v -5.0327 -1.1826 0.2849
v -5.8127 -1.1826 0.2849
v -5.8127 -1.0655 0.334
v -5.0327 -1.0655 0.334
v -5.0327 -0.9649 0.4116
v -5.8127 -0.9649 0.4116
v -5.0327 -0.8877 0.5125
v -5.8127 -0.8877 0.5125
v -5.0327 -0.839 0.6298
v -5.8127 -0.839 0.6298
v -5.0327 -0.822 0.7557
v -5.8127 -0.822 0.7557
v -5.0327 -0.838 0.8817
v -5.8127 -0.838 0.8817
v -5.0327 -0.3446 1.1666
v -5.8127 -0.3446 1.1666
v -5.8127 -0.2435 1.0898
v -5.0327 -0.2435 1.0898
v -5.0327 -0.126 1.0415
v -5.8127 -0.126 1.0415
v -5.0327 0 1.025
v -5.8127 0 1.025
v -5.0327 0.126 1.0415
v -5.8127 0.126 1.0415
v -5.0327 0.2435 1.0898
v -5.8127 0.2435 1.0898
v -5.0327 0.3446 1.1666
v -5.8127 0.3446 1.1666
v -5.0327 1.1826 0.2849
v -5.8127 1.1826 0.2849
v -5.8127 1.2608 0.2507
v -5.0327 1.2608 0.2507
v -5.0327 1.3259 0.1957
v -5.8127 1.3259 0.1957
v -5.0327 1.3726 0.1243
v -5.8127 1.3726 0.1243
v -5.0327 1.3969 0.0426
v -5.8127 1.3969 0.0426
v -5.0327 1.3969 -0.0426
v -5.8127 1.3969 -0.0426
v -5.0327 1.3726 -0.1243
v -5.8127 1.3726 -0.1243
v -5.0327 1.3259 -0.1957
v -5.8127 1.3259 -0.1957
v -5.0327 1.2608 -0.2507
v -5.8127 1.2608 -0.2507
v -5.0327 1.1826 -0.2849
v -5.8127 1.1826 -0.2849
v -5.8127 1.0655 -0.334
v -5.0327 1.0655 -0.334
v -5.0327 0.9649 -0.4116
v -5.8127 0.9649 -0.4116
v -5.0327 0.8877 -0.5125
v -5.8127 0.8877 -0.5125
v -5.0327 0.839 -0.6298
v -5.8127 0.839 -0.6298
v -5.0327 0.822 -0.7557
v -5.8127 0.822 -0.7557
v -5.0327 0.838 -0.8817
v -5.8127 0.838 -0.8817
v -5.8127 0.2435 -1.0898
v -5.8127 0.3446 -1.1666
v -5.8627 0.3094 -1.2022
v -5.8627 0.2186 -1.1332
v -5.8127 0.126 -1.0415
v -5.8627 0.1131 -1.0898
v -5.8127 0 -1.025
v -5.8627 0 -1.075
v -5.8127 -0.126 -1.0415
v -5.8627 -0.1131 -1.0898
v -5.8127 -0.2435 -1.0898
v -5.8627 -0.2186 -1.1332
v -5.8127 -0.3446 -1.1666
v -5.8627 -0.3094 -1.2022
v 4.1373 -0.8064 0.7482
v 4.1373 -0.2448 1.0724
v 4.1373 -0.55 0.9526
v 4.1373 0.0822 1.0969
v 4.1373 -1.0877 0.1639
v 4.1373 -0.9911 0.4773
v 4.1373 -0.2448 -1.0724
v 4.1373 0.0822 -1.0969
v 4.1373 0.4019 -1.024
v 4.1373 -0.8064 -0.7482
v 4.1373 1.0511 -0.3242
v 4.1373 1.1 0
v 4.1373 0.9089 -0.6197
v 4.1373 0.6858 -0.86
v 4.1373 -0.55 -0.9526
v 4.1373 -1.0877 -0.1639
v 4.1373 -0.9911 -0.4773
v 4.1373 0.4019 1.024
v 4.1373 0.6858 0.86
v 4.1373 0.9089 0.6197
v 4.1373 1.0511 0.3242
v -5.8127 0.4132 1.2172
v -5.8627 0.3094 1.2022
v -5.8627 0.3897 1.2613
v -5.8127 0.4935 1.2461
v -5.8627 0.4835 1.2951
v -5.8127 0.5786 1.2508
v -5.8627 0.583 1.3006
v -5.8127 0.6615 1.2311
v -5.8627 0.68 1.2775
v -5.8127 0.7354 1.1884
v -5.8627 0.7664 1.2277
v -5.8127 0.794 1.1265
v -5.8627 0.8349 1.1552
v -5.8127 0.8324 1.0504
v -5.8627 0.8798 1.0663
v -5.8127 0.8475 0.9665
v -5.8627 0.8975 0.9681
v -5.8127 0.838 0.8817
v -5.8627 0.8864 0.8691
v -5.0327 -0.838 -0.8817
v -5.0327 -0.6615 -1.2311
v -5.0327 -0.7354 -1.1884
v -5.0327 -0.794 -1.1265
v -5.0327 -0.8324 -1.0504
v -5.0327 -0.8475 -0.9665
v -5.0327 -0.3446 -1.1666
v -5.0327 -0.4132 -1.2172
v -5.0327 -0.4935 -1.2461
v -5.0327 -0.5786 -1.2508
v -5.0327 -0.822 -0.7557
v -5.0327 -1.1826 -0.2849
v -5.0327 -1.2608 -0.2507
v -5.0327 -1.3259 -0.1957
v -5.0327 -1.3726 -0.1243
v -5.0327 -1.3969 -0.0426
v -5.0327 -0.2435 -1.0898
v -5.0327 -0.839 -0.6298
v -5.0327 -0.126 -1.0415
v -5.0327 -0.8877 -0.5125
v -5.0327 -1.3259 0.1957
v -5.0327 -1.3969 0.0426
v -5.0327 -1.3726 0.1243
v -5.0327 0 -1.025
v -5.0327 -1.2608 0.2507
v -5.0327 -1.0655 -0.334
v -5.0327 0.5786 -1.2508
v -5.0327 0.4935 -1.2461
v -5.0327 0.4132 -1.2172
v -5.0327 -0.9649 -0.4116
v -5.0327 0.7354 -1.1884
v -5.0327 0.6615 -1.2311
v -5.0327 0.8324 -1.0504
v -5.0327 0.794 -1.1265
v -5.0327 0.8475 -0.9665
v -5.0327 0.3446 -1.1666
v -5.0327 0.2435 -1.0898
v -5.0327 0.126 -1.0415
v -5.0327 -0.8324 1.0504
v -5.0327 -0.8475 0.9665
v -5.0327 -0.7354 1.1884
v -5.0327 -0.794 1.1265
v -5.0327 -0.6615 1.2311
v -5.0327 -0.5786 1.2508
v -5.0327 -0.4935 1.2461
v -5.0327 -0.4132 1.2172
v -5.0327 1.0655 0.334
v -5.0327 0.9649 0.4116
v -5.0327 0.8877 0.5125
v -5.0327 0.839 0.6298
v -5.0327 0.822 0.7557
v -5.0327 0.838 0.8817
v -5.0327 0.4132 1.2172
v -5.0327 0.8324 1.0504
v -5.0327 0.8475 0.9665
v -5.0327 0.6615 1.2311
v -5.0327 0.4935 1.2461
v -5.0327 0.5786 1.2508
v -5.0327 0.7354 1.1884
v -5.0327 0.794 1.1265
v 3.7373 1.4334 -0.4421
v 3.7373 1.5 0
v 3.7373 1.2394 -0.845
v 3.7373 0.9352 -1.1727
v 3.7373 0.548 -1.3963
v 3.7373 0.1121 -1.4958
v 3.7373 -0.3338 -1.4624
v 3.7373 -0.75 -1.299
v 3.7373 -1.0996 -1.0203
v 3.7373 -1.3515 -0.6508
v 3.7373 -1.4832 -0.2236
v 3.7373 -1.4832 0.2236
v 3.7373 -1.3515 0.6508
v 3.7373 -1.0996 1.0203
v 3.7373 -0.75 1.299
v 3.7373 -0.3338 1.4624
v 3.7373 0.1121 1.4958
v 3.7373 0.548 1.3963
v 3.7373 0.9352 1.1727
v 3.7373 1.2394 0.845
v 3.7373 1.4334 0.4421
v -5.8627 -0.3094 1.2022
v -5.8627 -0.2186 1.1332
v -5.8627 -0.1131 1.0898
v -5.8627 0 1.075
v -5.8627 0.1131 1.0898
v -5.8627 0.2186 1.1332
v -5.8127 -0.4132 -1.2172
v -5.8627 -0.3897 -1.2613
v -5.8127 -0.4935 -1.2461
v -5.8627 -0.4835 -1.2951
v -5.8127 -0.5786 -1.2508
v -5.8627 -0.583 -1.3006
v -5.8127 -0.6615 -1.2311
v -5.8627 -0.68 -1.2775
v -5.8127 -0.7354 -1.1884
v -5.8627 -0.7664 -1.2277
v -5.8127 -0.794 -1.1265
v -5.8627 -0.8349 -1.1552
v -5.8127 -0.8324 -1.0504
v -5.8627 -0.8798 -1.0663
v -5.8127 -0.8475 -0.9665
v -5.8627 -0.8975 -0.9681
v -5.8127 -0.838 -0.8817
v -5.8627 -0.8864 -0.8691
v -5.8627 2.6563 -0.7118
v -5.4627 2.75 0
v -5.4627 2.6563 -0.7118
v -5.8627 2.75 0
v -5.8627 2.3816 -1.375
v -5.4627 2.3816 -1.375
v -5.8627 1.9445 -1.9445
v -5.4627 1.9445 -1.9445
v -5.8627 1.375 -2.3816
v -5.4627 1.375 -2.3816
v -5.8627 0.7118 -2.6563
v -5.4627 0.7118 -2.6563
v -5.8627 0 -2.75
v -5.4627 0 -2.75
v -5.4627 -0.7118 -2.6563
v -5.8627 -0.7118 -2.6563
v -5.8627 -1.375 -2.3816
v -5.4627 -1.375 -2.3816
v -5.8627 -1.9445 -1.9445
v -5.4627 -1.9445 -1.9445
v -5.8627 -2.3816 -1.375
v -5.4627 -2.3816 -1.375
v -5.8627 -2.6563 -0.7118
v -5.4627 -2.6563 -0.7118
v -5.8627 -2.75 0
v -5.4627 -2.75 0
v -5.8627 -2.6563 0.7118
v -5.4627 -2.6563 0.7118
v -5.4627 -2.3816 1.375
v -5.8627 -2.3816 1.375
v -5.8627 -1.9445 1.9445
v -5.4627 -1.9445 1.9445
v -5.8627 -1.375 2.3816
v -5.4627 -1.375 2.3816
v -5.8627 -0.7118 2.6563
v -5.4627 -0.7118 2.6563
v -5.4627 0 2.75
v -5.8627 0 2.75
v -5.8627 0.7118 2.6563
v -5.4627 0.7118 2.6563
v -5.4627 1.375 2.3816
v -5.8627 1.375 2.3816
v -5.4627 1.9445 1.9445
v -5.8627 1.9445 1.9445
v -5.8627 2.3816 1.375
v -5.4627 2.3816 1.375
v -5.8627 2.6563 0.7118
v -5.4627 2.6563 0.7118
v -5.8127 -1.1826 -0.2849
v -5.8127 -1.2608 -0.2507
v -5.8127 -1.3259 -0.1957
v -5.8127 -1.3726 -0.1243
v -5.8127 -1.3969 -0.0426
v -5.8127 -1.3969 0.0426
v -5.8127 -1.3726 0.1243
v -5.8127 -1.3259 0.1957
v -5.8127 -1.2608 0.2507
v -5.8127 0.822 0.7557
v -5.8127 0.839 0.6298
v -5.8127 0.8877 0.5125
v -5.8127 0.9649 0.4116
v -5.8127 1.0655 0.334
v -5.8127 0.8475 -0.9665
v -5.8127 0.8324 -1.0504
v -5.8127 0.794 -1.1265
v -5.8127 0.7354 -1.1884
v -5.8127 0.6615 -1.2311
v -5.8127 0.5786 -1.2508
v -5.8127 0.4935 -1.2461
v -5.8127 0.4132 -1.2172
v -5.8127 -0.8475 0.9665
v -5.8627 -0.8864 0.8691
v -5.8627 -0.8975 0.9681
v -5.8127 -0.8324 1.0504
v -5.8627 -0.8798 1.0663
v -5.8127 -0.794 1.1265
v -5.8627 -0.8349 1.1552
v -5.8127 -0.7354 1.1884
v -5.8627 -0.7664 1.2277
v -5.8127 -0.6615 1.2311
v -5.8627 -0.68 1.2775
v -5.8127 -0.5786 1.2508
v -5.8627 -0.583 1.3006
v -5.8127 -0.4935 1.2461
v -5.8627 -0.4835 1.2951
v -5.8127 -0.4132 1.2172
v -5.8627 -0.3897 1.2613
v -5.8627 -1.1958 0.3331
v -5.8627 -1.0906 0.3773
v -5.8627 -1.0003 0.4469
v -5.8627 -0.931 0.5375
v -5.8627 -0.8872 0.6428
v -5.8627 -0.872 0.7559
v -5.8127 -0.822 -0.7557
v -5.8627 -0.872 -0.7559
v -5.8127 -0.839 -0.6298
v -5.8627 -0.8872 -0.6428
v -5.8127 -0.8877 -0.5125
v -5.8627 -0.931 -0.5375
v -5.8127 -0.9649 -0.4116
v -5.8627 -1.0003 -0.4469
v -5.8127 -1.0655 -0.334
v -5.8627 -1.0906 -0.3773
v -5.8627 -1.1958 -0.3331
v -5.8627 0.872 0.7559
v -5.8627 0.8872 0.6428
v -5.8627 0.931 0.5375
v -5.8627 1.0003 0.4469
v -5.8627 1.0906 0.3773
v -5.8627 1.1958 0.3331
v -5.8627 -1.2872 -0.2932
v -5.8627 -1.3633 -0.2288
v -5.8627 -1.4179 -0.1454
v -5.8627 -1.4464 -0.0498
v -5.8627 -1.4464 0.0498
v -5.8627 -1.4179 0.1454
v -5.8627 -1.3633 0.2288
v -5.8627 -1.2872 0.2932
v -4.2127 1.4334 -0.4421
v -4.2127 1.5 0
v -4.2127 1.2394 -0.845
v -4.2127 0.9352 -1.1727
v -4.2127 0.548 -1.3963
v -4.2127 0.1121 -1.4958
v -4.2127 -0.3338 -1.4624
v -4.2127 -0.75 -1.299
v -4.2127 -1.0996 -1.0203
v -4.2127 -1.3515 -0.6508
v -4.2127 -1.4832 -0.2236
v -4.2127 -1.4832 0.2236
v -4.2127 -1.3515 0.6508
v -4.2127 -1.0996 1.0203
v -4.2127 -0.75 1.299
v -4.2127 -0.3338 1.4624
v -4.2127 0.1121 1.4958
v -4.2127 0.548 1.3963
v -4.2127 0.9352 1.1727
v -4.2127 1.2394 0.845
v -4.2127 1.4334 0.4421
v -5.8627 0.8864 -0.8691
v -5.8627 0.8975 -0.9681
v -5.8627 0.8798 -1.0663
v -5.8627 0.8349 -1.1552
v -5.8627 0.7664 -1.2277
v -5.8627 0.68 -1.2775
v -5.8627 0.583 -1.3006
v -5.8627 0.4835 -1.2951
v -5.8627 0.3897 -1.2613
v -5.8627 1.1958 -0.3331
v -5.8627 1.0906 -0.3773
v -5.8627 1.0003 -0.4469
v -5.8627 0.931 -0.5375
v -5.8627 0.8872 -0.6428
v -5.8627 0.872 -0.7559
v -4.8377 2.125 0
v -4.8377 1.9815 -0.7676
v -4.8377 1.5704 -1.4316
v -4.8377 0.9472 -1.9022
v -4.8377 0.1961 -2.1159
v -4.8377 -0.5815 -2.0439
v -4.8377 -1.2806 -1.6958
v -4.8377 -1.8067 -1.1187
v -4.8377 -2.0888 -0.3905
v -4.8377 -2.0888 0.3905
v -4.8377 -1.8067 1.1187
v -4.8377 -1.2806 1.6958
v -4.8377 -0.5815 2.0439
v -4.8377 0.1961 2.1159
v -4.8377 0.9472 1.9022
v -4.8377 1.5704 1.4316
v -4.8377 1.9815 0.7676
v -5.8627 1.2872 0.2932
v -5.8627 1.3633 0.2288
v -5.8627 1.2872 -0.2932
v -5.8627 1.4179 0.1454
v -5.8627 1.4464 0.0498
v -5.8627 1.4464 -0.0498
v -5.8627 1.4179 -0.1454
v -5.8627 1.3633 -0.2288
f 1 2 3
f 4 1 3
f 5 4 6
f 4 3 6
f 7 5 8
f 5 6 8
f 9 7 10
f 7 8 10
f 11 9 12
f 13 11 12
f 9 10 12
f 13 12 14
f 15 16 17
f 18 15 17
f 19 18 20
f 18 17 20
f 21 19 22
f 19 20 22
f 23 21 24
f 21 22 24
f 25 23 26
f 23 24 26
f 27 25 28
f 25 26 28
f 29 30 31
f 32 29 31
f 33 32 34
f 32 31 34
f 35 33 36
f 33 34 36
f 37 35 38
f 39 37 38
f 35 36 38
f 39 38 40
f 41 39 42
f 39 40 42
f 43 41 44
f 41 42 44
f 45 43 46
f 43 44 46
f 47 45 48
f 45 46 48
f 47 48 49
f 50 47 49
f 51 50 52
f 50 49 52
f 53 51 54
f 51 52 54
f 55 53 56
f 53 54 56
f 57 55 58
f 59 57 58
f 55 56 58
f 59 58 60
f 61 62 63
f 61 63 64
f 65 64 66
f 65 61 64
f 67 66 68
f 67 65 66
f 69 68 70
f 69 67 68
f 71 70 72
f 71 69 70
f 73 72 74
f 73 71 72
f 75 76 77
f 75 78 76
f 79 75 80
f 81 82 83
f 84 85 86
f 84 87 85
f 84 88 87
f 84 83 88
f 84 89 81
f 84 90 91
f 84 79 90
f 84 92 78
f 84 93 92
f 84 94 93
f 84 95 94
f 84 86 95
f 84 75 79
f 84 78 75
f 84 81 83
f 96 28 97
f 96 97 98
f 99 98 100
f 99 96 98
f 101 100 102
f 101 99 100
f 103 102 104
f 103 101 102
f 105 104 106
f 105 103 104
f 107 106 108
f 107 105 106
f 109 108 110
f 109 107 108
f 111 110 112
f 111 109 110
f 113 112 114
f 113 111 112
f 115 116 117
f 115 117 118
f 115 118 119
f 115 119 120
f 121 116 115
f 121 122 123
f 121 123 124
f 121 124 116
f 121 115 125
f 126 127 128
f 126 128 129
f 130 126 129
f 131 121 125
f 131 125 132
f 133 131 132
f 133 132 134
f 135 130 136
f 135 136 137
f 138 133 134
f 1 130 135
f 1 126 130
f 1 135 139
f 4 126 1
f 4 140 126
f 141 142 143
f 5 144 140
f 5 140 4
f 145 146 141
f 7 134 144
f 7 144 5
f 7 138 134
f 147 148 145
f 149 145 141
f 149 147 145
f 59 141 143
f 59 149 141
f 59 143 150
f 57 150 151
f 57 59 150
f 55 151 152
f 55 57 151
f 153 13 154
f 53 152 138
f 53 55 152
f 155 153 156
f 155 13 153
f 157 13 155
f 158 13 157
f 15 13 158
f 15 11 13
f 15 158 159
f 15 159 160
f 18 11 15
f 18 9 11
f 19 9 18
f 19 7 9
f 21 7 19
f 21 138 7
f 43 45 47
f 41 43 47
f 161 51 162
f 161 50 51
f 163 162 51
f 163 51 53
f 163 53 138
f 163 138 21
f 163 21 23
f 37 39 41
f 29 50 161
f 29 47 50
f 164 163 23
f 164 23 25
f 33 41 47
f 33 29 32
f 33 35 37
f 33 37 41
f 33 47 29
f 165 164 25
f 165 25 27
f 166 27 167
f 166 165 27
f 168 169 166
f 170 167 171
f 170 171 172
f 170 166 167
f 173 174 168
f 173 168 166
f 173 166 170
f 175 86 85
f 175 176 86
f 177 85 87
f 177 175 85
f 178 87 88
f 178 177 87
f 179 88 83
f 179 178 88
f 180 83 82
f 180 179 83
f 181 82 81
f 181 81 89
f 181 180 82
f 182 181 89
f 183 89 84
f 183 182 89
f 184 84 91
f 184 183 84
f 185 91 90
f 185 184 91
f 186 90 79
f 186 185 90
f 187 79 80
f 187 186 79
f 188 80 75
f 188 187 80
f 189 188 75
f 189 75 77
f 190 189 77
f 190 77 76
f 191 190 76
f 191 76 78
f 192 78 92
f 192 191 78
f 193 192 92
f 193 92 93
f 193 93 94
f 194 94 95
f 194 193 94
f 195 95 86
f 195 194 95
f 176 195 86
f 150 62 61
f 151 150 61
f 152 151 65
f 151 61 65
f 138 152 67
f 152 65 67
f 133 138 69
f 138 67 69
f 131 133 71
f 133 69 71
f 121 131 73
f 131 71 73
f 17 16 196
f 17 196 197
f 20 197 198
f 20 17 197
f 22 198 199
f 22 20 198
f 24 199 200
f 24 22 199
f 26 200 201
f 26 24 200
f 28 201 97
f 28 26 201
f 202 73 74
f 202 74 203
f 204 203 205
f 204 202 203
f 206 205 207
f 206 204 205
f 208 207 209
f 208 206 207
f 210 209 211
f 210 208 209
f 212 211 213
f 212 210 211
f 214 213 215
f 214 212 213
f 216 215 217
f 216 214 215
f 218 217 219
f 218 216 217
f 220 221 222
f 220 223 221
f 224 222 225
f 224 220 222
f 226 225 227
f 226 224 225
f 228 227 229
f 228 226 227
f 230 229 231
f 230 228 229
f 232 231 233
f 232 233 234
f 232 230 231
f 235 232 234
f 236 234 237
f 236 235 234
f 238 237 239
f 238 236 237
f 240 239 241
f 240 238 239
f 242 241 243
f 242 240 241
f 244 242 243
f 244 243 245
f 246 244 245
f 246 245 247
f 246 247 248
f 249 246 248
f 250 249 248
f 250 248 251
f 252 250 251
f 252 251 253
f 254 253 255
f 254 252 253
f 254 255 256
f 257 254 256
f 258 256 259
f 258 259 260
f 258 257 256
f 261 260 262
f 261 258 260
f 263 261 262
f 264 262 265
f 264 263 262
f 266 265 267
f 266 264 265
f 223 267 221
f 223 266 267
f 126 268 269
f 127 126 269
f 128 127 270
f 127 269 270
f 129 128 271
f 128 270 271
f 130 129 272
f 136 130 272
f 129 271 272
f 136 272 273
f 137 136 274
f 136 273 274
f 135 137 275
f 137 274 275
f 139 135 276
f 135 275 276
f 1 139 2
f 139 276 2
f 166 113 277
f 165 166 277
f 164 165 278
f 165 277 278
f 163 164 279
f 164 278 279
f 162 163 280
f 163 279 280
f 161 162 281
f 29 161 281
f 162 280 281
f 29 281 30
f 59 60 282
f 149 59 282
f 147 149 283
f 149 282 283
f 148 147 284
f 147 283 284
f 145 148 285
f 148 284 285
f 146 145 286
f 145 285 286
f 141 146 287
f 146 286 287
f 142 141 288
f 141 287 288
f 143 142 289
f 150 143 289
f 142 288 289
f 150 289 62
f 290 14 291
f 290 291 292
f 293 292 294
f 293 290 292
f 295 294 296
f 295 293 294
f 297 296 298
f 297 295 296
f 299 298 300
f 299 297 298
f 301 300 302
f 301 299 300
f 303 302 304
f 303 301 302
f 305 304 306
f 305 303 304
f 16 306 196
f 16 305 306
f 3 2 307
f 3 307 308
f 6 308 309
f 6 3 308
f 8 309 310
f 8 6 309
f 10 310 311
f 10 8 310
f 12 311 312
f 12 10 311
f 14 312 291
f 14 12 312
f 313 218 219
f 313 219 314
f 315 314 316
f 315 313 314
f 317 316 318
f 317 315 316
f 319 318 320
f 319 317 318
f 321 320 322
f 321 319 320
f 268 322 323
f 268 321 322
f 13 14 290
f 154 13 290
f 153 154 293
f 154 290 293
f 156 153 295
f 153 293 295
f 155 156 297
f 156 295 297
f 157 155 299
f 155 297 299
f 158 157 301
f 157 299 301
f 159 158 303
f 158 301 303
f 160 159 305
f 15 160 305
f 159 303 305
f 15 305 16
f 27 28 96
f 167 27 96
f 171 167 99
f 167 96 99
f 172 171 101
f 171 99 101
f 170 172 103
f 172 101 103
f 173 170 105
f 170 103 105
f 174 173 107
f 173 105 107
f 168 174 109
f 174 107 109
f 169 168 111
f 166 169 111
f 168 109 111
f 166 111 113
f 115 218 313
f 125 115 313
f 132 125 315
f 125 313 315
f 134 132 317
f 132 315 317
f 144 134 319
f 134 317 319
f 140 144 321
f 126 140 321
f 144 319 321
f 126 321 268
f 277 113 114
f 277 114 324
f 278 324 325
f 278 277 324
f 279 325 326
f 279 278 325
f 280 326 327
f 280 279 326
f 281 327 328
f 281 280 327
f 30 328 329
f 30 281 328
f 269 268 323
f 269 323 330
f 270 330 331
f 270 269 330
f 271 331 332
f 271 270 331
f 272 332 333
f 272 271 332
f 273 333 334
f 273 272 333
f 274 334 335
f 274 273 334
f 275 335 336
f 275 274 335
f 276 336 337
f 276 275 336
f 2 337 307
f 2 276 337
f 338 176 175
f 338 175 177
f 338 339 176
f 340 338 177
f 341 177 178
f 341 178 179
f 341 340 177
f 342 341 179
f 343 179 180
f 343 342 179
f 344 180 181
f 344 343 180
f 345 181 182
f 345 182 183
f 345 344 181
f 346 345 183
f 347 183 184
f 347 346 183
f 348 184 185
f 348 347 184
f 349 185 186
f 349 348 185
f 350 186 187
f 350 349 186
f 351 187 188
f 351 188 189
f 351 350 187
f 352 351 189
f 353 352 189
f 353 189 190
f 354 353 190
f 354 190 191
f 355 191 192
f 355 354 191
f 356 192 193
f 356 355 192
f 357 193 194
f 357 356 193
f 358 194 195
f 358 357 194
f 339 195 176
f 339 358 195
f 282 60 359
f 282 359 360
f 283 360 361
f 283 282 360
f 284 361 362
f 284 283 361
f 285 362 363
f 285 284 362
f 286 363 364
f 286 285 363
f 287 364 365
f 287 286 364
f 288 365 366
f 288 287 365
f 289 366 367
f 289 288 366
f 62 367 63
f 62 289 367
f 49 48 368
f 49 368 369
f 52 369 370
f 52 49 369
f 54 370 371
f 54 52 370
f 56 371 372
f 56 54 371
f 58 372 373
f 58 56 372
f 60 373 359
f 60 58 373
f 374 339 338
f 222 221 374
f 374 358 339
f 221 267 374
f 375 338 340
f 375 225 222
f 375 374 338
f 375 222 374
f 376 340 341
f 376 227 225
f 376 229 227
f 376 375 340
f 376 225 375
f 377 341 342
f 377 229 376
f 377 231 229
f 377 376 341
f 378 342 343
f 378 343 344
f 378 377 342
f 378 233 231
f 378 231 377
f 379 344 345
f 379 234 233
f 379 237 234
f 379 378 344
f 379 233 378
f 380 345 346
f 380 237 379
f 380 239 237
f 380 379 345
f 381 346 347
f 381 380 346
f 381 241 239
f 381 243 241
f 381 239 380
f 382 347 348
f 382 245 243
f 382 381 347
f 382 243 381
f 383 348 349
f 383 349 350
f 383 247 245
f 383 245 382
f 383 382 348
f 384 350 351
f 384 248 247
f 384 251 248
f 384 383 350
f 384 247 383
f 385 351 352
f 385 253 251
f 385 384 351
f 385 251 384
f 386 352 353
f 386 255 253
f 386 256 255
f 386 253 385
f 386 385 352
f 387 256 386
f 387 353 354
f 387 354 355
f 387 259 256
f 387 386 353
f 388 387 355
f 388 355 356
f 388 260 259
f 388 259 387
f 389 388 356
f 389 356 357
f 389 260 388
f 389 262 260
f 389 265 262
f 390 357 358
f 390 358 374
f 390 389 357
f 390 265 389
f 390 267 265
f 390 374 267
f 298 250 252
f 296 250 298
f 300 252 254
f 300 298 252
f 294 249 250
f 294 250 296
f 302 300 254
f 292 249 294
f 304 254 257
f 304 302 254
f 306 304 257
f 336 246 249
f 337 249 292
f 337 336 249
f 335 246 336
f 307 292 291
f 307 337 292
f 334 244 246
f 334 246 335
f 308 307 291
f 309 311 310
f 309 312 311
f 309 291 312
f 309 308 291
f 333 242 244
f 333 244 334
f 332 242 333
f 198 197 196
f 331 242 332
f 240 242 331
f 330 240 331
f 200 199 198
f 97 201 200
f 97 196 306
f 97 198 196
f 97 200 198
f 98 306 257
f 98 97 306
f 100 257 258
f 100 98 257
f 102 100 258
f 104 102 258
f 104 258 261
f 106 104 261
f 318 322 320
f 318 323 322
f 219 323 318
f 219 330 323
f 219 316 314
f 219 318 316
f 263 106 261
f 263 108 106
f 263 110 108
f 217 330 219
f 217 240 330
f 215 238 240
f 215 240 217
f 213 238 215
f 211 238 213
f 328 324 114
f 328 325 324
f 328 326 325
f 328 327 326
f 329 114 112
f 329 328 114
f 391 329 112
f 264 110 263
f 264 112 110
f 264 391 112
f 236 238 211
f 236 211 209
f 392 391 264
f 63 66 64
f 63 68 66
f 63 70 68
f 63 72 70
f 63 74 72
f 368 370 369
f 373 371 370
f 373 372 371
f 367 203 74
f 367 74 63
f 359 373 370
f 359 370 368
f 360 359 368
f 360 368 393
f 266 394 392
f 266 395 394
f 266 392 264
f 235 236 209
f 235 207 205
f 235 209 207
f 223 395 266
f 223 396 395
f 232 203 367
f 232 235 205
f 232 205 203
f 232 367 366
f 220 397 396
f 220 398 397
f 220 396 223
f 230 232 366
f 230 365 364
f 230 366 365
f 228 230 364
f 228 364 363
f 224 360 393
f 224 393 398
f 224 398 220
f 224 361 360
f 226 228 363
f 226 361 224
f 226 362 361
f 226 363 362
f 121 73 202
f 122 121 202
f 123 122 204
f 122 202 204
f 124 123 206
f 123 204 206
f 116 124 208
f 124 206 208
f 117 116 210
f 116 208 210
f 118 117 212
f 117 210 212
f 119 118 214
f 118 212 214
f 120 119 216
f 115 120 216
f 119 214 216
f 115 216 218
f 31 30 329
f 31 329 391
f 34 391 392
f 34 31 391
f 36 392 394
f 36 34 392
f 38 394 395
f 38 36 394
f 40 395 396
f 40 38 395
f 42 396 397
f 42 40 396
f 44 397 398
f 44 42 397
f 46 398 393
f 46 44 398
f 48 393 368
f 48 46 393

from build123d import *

# Parameters (mm, degrees)
CUT_EXTRUDE1_DEPTH = 0.83
CHAMFER2_SIZE      = 0.05


with BuildPart() as part:
    # Sketch1 → Revolve1 (revolve)
    with BuildSketch(Plane.XY):
        Polygon((-4.212732686, 1.5), (-5.462732686, 2.75), (-5.862732686, 2.75), (-5.862732686, 0), (4.137267314, 0), (4.137267314, 1.1), (3.737267314, 1.5), align=None)
    revolve(axis=Axis((48.184792793, 0, 0), (-1, 0, 0)))

    # Sketch2 → Cut-Extrude1 (cut)
    with BuildSketch(Plane.ZY.offset(5.862732686)):
        with BuildLine():
            ThreePointArc((1.16663108, 0.344585397), (1.212435565, 0.7), (0.881735248, 0.838039454))
            ThreePointArc((0.881735248, 0.838039454), (0.5125, 0.887676039), (0.284895833, 1.182624851))
            ThreePointArc((0.284895833, 1.182624851), (0, 1.4), (-0.284895833, 1.182624851))
            ThreePointArc((-0.284895833, 1.182624851), (-0.5125, 0.887676039), (-0.881735248, 0.838039454))
            ThreePointArc((-0.881735248, 0.838039454), (-1.212435565, 0.7), (-1.16663108, 0.344585397))
            ThreePointArc((-1.16663108, 0.344585397), (-1.025, 0), (-1.16663108, -0.344585397))
            ThreePointArc((-1.16663108, -0.344585397), (-1.212435565, -0.7), (-0.881735248, -0.838039454))
            ThreePointArc((-0.881735248, -0.838039454), (-0.5125, -0.887676039), (-0.284895833, -1.182624851))
            ThreePointArc((-0.284895833, -1.182624851), (0, -1.4), (0.284895833, -1.182624851))
            ThreePointArc((0.284895833, -1.182624851), (0.5125, -0.887676039), (0.881735248, -0.838039454))
            ThreePointArc((0.881735248, -0.838039454), (1.212435565, -0.7), (1.16663108, -0.344585397))
            ThreePointArc((1.16663108, -0.344585397), (1.025, 0), (1.16663108, 0.344585397))
        make_face()
    extrude(amount=-CUT_EXTRUDE1_DEPTH, mode=Mode.SUBTRACT)

    # Chamfer2
    chamfer2_edges = [part.edges().sort_by_distance(p)[0] for p in [
        (-5.862732686, 0.887676039, 0.5125),
        (-5.862732686, 0, 1.025),
        (-5.862732686, -0.887676039, 0.5125),
        (-5.862732686, -0.887676039, -0.5125),
        (-5.862732686, 0, -1.025),
        (-5.862732686, 0.887676039, -0.5125),
        (-5.862732686, 1.4, 0),
        (-5.862732686, 0.7, -1.212435565),
        (-5.862732686, -0.7, -1.212435565),
        (-5.862732686, -1.4, 0),
        (-5.862732686, -0.7, 1.212435565),
        (-5.862732686, 0.7, 1.212435565),
    ]]
    chamfer(chamfer2_edges, length=CHAMFER2_SIZE)


solid = part.part
